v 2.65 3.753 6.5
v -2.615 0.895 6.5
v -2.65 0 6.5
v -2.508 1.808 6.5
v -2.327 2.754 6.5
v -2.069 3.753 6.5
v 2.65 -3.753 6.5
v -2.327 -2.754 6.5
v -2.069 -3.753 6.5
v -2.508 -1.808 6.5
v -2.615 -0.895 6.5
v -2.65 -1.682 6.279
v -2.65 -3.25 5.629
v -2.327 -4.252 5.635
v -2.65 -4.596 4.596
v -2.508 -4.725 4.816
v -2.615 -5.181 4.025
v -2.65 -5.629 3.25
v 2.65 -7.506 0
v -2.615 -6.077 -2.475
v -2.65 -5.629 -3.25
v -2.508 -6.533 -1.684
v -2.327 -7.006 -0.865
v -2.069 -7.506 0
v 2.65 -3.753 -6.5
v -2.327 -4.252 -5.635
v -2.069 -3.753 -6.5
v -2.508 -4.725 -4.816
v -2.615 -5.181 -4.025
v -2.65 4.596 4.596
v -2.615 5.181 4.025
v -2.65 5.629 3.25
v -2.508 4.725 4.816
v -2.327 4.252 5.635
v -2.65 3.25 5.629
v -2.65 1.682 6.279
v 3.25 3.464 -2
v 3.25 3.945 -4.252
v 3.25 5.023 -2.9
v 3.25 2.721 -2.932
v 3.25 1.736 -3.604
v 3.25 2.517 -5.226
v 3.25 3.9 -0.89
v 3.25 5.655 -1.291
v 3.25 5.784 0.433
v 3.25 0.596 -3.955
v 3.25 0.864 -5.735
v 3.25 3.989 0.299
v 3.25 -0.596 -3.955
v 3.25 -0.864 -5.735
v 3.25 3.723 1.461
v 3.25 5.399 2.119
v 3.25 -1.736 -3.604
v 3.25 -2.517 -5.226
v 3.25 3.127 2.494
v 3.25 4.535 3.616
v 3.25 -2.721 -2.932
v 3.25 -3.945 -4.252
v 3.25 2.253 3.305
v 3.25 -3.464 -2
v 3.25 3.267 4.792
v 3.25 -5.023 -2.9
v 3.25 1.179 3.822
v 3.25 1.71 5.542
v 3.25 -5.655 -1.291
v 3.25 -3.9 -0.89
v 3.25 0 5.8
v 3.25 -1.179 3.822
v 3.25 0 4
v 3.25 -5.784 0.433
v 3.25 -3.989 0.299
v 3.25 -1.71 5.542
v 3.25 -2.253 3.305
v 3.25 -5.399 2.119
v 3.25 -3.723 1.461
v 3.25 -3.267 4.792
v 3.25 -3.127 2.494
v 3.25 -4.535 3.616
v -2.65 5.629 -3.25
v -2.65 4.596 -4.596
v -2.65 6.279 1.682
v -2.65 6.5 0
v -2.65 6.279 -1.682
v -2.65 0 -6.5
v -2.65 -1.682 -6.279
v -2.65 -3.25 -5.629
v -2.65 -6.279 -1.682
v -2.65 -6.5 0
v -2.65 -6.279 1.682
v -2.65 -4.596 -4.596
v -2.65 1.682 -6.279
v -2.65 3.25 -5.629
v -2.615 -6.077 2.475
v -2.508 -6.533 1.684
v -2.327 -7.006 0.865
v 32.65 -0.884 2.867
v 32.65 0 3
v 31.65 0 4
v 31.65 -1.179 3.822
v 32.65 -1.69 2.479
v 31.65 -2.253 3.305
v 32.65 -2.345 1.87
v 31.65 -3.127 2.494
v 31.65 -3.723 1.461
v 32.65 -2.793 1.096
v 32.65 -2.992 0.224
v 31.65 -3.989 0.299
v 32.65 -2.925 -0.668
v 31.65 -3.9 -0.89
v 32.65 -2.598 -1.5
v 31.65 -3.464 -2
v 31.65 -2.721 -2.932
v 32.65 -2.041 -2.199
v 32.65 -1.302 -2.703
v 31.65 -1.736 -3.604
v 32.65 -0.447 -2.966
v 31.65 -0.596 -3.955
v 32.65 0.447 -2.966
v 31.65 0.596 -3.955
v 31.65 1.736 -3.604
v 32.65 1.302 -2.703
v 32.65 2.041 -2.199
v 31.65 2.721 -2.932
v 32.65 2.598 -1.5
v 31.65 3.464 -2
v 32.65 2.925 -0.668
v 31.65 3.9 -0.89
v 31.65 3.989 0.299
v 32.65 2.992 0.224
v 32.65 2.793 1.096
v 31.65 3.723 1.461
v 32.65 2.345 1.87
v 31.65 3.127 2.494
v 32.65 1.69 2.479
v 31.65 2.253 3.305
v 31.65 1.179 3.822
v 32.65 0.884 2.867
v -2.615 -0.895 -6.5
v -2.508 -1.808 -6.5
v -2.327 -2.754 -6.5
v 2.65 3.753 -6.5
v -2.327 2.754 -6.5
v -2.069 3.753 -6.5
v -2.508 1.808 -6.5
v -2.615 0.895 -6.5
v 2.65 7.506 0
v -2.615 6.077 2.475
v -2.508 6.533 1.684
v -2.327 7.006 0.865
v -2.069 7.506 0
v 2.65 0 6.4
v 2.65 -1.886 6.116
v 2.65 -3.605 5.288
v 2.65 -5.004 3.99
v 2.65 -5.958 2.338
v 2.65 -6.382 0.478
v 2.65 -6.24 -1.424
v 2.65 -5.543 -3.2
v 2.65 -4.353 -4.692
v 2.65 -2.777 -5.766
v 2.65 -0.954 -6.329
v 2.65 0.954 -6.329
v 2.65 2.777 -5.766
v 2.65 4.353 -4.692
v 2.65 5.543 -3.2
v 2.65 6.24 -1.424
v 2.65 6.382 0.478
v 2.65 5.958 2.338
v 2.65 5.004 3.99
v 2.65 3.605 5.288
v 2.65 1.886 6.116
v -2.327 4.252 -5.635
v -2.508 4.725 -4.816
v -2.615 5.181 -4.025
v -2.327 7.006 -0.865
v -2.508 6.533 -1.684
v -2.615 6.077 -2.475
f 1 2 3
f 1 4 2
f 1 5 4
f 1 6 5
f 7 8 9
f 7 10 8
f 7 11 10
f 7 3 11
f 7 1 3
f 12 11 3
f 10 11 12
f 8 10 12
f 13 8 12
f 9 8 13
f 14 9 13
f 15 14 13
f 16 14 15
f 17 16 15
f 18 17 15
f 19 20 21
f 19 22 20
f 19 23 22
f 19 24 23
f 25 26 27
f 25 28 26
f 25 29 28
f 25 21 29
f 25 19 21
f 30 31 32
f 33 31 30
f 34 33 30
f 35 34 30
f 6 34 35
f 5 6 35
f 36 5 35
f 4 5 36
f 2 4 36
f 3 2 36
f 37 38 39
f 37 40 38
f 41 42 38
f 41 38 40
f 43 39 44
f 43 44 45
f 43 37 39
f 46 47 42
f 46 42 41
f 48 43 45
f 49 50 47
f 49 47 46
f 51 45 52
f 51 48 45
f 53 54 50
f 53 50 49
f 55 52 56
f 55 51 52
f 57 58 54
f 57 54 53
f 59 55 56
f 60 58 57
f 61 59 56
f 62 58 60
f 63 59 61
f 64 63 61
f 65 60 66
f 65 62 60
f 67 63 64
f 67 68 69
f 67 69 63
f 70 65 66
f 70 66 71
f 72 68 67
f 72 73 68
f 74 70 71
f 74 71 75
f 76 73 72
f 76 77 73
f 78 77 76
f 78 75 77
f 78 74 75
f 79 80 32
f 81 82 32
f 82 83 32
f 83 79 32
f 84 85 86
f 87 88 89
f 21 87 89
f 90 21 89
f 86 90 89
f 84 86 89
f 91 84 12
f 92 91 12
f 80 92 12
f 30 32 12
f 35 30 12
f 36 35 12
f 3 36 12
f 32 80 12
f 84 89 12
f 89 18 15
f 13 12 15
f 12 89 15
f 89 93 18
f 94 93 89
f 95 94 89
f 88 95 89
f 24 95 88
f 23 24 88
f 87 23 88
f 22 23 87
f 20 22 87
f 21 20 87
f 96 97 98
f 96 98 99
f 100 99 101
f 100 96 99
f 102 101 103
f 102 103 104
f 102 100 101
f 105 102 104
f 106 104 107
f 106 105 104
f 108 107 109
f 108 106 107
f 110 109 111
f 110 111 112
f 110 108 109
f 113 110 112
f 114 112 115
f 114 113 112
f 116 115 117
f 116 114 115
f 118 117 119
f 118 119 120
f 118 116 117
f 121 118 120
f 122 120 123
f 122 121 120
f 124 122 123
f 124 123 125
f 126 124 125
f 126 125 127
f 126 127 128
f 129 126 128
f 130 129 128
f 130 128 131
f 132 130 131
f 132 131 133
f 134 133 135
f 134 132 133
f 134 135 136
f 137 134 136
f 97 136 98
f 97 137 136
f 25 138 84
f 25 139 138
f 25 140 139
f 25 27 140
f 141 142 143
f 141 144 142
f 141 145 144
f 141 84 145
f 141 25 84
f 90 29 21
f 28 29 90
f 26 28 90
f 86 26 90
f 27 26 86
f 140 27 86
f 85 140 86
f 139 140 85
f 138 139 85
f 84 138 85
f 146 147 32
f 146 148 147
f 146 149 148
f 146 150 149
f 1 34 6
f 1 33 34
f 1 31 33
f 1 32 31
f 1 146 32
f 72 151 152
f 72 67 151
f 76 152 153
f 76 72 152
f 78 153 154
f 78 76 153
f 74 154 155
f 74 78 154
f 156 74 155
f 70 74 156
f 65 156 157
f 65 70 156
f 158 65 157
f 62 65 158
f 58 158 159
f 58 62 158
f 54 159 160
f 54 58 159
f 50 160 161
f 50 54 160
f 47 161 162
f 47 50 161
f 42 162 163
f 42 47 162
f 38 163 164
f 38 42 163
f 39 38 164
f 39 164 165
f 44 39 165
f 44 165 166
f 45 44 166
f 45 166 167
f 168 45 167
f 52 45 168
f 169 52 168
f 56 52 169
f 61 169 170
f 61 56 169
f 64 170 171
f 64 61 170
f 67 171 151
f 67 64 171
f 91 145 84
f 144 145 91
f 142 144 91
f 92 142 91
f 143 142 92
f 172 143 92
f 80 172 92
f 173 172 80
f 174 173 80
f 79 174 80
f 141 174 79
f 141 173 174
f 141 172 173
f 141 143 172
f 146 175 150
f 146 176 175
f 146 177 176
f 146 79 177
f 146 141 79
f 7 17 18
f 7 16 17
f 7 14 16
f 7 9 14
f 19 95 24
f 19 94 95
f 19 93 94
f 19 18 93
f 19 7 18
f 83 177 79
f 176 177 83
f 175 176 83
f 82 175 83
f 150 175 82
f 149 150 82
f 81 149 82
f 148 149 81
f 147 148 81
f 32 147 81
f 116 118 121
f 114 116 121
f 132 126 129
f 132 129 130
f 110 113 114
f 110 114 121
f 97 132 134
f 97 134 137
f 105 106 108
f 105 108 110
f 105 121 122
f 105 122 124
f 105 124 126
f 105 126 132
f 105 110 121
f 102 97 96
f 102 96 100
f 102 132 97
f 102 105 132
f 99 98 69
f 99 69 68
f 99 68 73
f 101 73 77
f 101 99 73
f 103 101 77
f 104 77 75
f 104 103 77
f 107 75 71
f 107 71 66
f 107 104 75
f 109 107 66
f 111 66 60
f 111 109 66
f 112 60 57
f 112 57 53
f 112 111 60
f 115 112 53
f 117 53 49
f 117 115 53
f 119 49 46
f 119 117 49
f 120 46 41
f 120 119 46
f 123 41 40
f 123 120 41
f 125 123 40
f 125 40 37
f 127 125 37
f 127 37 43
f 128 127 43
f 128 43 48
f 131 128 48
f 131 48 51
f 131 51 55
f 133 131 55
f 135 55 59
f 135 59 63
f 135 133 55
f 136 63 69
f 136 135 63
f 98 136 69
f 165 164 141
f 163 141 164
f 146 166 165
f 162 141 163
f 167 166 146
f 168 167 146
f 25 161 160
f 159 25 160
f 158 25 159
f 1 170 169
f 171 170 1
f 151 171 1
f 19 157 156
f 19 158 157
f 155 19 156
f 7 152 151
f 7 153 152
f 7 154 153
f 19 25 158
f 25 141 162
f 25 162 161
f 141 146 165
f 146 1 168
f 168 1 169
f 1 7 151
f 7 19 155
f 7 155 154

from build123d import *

# Parameters (mm, degrees)
EXTRUDE_1_DEPTH = 2.65
CHAMFER_2_SIZE  = 1


with BuildPart() as part:
    # 草图1 → 拉伸1 (new, symmetric)
    with BuildSketch(Plane(origin=(0, 0, 0), x_dir=(0, 0, 1), z_dir=(1, 0, 0))):
        Polygon((0, 7.505553499), (-6.5, 3.75277675), (-6.5, -3.75277675), (0, -7.505553499), (6.5, -3.75277675), (6.5, 3.75277675), align=None)
    extrude(amount=EXTRUDE_1_DEPTH, both=True)

    # 草图2 → 切除-旋转2 (revolve, cut)
    with BuildSketch(Plane.XY):
        Polygon((-2.65, 6.5), (0.034663773, 11.149974056), (-2.65, 11.149974056), align=None)
    revolve(axis=Axis((-3.243026821, 0, 0), (1, 0, 0)), mode=Mode.SUBTRACT)

    # 草图3 → 旋转1 (revolve)
    with BuildSketch(Plane.XY, mode=Mode.PRIVATE) as revolve_1_sk:
        Polygon((2.65, 0), (2.65, 6.4), (3.25, 5.8), (3.25, 4), (32.65, 4), (32.65, 0), align=None)
    revolve(revolve_1_sk.sketch.rotate(Axis((-4.543756915, 0, 0), (1, 0, 0)), 90), axis=Axis((-4.543756915, 0, 0), (1, 0, 0)))

    # 倒角2
    chamfer_2_edges = [part.edges().sort_by_distance(p)[0] for p in [
        (32.65, 0, -4),
    ]]
    chamfer(chamfer_2_edges, length=CHAMFER_2_SIZE)


solid = part.part
